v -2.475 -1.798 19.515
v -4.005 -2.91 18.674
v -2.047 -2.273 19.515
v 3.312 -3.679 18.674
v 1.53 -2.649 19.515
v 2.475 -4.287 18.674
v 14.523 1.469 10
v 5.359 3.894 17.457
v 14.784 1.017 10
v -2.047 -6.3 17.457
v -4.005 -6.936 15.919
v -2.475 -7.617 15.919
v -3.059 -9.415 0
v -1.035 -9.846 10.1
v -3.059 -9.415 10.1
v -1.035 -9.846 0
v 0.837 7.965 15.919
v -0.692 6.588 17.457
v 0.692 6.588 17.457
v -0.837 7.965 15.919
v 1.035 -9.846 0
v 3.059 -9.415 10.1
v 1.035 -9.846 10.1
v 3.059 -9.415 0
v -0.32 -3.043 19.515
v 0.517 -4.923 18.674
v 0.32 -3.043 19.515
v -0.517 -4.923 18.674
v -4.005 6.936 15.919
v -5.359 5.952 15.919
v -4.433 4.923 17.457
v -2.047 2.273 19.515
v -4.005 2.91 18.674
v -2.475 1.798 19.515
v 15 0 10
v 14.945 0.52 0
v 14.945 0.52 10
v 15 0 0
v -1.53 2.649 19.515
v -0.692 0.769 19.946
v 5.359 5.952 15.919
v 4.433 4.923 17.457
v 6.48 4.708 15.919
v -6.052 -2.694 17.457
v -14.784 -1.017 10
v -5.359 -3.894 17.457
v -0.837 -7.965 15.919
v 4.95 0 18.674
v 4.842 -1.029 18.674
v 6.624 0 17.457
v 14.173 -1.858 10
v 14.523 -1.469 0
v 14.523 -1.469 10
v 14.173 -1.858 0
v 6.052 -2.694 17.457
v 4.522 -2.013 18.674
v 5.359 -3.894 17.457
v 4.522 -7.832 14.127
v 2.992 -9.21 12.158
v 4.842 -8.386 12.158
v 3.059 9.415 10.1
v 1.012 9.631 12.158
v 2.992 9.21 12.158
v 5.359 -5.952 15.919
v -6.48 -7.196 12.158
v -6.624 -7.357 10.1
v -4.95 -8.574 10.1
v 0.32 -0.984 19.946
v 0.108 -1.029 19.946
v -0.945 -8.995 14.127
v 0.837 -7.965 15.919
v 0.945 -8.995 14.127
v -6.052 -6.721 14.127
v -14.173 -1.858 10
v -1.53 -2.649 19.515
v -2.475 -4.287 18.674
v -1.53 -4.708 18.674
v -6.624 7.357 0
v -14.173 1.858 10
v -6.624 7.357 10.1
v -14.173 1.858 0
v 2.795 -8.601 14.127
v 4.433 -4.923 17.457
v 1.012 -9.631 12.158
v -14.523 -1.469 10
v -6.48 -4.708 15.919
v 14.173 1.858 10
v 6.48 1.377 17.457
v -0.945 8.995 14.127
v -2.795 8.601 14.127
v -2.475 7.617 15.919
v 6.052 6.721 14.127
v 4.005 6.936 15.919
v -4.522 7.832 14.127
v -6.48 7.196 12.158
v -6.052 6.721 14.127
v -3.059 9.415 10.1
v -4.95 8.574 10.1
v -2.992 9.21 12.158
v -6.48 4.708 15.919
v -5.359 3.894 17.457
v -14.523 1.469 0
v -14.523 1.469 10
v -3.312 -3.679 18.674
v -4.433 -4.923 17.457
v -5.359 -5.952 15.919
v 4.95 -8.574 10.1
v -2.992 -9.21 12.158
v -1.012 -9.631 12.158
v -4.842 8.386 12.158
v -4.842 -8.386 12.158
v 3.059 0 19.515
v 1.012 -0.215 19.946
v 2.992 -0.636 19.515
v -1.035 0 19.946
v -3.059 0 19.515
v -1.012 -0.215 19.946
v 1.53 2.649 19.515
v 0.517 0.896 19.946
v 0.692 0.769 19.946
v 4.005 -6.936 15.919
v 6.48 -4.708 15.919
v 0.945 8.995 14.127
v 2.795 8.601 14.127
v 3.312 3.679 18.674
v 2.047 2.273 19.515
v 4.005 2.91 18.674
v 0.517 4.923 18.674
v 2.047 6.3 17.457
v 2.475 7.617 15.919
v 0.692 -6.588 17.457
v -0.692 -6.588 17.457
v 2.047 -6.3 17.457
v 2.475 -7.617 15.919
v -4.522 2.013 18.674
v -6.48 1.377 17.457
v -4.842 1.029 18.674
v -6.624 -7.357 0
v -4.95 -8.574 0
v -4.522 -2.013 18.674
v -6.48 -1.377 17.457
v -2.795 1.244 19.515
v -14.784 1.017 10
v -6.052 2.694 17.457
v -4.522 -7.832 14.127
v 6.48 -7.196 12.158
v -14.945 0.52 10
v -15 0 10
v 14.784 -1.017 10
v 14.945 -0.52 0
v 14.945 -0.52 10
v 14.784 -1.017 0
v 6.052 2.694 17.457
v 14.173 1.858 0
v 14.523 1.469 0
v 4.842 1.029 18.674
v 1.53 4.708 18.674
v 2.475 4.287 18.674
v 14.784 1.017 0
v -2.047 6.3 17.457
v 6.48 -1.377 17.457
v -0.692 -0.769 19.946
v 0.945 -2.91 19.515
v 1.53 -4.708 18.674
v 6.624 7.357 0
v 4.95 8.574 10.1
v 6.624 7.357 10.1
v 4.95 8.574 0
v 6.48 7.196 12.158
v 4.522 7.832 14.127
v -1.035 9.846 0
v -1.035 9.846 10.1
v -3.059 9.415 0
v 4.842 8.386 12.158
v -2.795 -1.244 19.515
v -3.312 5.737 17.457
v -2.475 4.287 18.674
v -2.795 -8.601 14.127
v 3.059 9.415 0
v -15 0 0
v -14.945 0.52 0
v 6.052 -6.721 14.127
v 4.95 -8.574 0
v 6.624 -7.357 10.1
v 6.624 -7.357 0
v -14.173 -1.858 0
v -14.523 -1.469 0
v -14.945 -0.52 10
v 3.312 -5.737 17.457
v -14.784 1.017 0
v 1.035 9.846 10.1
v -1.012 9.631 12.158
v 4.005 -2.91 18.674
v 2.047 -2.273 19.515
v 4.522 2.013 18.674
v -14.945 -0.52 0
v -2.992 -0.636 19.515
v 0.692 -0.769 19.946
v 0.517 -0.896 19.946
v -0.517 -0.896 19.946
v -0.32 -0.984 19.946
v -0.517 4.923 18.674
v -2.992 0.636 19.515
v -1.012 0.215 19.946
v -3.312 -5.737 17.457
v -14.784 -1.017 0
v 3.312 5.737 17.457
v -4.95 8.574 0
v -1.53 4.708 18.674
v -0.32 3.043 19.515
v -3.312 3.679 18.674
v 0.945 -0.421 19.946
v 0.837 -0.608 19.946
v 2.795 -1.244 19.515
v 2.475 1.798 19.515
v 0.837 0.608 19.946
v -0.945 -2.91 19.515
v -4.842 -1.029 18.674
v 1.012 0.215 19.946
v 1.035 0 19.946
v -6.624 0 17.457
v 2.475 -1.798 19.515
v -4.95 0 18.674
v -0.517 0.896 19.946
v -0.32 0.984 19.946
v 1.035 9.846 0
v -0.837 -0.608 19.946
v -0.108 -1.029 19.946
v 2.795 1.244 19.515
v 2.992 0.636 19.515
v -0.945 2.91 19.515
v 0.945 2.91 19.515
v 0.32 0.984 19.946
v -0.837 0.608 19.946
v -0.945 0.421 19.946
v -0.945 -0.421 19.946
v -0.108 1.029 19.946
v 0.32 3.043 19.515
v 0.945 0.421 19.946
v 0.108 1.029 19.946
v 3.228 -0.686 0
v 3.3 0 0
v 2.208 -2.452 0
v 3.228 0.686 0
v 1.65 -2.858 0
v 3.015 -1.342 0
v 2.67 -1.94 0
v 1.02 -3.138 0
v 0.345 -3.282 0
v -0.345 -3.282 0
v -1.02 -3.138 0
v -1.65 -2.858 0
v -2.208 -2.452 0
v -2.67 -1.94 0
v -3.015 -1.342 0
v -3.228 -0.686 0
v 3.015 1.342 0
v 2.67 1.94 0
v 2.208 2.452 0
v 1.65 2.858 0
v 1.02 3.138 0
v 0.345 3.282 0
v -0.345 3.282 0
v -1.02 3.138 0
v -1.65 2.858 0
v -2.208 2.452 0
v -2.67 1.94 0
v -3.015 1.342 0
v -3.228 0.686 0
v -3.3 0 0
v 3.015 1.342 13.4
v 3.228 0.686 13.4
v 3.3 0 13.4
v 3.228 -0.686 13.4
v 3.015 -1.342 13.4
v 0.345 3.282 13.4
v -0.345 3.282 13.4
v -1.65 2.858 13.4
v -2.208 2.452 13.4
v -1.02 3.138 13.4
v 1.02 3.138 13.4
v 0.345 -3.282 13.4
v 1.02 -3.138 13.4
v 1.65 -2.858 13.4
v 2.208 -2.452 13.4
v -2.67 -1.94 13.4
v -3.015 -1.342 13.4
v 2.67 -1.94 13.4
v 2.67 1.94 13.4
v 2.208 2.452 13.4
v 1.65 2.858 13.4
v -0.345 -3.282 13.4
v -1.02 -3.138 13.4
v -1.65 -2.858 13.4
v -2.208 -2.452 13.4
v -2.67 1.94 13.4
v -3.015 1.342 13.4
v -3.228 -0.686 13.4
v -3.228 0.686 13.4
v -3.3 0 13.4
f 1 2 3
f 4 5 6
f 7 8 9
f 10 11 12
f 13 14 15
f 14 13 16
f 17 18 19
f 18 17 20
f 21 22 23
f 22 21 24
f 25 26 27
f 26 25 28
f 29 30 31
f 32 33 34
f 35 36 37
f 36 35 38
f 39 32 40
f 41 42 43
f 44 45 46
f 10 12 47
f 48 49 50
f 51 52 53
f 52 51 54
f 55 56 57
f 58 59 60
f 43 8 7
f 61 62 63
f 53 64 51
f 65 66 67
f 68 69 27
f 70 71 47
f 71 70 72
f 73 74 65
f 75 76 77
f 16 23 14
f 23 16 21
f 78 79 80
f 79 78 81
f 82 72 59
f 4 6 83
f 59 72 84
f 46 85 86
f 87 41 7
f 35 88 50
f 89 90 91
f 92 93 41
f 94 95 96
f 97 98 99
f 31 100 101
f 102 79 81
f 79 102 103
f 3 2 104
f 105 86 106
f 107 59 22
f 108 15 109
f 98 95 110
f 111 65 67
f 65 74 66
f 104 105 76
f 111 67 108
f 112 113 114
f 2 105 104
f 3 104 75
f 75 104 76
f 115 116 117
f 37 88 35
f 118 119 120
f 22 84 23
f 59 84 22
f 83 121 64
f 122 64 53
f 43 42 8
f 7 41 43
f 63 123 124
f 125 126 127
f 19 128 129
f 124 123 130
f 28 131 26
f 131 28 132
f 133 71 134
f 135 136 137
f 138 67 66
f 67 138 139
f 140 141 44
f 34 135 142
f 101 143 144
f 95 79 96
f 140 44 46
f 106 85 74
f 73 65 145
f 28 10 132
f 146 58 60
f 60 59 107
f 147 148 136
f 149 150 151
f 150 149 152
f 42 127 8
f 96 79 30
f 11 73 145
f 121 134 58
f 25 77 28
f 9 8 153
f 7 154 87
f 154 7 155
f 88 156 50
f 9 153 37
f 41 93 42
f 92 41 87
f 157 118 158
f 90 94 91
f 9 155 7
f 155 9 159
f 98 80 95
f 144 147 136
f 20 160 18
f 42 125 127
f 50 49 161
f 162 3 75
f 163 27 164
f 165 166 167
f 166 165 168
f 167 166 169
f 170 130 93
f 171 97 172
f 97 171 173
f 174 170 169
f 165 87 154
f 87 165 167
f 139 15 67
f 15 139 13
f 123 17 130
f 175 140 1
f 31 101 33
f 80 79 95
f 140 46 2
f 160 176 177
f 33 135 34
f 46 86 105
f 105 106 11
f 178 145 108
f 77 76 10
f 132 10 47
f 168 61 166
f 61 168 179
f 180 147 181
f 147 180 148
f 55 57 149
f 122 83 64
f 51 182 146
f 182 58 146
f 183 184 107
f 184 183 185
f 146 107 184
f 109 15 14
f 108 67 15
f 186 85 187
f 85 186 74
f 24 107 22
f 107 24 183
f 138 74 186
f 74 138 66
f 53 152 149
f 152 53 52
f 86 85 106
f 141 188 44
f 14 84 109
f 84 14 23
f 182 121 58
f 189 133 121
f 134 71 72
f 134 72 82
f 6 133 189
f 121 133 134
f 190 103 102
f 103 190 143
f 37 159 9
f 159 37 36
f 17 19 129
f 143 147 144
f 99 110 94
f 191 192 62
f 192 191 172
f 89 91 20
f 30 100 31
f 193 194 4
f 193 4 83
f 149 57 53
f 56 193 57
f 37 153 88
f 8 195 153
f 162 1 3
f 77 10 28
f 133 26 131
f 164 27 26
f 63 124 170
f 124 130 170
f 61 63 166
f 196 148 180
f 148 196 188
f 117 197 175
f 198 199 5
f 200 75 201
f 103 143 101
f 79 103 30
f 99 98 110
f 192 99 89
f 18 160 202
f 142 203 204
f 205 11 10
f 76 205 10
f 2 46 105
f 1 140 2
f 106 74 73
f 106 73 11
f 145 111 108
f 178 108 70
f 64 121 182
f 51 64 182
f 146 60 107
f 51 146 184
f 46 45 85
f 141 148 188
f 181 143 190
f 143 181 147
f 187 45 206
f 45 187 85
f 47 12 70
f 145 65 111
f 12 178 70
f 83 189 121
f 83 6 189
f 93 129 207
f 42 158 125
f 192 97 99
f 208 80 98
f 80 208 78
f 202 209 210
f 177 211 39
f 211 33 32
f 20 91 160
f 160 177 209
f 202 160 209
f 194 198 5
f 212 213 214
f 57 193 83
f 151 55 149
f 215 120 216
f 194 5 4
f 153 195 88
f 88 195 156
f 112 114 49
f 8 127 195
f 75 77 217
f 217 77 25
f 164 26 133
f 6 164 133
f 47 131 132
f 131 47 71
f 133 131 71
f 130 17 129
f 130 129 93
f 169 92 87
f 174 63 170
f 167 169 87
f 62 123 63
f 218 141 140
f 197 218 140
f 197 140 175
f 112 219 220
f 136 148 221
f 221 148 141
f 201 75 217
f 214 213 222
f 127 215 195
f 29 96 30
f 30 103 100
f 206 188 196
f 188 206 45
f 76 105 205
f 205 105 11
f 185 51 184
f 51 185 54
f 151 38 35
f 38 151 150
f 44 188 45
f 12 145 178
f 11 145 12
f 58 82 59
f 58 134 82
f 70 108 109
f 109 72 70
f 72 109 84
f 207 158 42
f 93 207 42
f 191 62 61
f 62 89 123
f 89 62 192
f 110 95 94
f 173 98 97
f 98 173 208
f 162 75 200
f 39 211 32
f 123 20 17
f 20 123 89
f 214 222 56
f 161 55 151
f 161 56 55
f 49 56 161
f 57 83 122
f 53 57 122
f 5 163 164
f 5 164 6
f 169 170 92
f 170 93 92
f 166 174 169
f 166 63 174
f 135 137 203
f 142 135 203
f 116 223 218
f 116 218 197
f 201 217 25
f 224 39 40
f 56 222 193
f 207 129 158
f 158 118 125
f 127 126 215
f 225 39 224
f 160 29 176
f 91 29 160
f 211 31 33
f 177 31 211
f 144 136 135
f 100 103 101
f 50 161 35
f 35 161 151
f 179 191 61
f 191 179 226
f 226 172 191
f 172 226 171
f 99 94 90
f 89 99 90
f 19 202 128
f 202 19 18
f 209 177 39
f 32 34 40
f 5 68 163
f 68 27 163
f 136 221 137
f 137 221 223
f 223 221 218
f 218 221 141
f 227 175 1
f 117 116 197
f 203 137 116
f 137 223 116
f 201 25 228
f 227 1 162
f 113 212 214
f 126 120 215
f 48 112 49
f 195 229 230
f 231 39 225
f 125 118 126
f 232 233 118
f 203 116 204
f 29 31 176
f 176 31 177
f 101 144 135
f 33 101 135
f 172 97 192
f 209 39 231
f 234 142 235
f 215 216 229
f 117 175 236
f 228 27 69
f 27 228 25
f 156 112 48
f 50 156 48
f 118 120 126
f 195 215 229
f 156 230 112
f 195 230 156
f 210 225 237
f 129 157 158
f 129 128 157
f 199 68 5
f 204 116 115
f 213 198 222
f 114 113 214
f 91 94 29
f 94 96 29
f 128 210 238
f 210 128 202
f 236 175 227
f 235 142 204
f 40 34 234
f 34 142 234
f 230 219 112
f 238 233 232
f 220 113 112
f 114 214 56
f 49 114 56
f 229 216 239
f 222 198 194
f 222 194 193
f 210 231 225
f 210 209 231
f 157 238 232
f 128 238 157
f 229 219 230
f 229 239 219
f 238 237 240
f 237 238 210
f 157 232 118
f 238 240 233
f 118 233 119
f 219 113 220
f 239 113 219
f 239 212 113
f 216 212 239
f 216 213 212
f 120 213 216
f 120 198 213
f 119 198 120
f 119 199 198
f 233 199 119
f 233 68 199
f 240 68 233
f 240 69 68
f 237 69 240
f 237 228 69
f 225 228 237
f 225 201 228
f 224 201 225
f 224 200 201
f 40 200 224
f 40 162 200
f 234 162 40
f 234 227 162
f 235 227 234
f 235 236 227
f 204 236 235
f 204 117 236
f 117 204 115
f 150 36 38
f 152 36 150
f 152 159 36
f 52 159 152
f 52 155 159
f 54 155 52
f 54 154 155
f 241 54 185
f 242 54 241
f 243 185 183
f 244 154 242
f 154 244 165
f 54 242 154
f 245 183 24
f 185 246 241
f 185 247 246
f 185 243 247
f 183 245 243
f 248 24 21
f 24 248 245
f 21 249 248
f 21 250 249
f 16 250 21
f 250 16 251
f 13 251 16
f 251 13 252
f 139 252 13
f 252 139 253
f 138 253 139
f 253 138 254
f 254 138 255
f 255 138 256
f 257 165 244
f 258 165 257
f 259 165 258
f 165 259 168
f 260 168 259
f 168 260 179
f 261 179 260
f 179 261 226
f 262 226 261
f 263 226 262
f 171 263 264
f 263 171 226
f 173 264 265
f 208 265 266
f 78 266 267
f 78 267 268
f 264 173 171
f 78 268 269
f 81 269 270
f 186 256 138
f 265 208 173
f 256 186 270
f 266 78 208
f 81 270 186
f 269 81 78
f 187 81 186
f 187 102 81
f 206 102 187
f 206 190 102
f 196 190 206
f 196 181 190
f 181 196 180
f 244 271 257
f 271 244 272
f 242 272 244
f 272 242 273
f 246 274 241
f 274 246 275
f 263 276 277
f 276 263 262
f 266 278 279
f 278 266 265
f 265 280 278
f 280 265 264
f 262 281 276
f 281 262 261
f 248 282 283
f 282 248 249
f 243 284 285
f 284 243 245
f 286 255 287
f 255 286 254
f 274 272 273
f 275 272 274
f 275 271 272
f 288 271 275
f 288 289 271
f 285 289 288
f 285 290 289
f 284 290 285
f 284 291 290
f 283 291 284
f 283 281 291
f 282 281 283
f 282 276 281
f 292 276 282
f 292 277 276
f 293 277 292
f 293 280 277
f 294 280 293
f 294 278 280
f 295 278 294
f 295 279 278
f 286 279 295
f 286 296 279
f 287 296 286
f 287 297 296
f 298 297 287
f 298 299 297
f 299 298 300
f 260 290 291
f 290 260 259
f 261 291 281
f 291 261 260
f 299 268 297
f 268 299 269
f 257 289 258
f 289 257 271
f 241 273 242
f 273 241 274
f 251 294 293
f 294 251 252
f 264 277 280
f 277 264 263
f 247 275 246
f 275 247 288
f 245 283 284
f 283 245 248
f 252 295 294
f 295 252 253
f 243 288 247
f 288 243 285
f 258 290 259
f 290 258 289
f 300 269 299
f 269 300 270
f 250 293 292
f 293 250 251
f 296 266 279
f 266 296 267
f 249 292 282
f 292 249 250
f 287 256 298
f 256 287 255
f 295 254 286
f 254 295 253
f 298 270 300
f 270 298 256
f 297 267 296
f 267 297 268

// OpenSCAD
hauteur=20;
rayon_vis=3.3;
ailes_width=5;
wings_span=15;
$fn=30;

difference(){
    hull(){
        translate([0,0,hauteur-(rayon_vis*3)]) sphere(r=rayon_vis*3);
        translate([0,0,-1])cylinder(r=rayon_vis*3,h=2);
        translate([wings_span-(ailes_width/2),0,-1]) 
            cylinder(r=ailes_width/2,h=hauteur/2+1);
        translate([-(wings_span-(ailes_width/2)),0,-1]) 
            cylinder(r=ailes_width/2,h=hauteur/2+1);
    }
    translate([0,0,-50]) cube([100,100,100],center=true);
    translate([0,0,-2]) cylinder(r=rayon_vis,h=hauteur-(rayon_vis*2)+2);
}
